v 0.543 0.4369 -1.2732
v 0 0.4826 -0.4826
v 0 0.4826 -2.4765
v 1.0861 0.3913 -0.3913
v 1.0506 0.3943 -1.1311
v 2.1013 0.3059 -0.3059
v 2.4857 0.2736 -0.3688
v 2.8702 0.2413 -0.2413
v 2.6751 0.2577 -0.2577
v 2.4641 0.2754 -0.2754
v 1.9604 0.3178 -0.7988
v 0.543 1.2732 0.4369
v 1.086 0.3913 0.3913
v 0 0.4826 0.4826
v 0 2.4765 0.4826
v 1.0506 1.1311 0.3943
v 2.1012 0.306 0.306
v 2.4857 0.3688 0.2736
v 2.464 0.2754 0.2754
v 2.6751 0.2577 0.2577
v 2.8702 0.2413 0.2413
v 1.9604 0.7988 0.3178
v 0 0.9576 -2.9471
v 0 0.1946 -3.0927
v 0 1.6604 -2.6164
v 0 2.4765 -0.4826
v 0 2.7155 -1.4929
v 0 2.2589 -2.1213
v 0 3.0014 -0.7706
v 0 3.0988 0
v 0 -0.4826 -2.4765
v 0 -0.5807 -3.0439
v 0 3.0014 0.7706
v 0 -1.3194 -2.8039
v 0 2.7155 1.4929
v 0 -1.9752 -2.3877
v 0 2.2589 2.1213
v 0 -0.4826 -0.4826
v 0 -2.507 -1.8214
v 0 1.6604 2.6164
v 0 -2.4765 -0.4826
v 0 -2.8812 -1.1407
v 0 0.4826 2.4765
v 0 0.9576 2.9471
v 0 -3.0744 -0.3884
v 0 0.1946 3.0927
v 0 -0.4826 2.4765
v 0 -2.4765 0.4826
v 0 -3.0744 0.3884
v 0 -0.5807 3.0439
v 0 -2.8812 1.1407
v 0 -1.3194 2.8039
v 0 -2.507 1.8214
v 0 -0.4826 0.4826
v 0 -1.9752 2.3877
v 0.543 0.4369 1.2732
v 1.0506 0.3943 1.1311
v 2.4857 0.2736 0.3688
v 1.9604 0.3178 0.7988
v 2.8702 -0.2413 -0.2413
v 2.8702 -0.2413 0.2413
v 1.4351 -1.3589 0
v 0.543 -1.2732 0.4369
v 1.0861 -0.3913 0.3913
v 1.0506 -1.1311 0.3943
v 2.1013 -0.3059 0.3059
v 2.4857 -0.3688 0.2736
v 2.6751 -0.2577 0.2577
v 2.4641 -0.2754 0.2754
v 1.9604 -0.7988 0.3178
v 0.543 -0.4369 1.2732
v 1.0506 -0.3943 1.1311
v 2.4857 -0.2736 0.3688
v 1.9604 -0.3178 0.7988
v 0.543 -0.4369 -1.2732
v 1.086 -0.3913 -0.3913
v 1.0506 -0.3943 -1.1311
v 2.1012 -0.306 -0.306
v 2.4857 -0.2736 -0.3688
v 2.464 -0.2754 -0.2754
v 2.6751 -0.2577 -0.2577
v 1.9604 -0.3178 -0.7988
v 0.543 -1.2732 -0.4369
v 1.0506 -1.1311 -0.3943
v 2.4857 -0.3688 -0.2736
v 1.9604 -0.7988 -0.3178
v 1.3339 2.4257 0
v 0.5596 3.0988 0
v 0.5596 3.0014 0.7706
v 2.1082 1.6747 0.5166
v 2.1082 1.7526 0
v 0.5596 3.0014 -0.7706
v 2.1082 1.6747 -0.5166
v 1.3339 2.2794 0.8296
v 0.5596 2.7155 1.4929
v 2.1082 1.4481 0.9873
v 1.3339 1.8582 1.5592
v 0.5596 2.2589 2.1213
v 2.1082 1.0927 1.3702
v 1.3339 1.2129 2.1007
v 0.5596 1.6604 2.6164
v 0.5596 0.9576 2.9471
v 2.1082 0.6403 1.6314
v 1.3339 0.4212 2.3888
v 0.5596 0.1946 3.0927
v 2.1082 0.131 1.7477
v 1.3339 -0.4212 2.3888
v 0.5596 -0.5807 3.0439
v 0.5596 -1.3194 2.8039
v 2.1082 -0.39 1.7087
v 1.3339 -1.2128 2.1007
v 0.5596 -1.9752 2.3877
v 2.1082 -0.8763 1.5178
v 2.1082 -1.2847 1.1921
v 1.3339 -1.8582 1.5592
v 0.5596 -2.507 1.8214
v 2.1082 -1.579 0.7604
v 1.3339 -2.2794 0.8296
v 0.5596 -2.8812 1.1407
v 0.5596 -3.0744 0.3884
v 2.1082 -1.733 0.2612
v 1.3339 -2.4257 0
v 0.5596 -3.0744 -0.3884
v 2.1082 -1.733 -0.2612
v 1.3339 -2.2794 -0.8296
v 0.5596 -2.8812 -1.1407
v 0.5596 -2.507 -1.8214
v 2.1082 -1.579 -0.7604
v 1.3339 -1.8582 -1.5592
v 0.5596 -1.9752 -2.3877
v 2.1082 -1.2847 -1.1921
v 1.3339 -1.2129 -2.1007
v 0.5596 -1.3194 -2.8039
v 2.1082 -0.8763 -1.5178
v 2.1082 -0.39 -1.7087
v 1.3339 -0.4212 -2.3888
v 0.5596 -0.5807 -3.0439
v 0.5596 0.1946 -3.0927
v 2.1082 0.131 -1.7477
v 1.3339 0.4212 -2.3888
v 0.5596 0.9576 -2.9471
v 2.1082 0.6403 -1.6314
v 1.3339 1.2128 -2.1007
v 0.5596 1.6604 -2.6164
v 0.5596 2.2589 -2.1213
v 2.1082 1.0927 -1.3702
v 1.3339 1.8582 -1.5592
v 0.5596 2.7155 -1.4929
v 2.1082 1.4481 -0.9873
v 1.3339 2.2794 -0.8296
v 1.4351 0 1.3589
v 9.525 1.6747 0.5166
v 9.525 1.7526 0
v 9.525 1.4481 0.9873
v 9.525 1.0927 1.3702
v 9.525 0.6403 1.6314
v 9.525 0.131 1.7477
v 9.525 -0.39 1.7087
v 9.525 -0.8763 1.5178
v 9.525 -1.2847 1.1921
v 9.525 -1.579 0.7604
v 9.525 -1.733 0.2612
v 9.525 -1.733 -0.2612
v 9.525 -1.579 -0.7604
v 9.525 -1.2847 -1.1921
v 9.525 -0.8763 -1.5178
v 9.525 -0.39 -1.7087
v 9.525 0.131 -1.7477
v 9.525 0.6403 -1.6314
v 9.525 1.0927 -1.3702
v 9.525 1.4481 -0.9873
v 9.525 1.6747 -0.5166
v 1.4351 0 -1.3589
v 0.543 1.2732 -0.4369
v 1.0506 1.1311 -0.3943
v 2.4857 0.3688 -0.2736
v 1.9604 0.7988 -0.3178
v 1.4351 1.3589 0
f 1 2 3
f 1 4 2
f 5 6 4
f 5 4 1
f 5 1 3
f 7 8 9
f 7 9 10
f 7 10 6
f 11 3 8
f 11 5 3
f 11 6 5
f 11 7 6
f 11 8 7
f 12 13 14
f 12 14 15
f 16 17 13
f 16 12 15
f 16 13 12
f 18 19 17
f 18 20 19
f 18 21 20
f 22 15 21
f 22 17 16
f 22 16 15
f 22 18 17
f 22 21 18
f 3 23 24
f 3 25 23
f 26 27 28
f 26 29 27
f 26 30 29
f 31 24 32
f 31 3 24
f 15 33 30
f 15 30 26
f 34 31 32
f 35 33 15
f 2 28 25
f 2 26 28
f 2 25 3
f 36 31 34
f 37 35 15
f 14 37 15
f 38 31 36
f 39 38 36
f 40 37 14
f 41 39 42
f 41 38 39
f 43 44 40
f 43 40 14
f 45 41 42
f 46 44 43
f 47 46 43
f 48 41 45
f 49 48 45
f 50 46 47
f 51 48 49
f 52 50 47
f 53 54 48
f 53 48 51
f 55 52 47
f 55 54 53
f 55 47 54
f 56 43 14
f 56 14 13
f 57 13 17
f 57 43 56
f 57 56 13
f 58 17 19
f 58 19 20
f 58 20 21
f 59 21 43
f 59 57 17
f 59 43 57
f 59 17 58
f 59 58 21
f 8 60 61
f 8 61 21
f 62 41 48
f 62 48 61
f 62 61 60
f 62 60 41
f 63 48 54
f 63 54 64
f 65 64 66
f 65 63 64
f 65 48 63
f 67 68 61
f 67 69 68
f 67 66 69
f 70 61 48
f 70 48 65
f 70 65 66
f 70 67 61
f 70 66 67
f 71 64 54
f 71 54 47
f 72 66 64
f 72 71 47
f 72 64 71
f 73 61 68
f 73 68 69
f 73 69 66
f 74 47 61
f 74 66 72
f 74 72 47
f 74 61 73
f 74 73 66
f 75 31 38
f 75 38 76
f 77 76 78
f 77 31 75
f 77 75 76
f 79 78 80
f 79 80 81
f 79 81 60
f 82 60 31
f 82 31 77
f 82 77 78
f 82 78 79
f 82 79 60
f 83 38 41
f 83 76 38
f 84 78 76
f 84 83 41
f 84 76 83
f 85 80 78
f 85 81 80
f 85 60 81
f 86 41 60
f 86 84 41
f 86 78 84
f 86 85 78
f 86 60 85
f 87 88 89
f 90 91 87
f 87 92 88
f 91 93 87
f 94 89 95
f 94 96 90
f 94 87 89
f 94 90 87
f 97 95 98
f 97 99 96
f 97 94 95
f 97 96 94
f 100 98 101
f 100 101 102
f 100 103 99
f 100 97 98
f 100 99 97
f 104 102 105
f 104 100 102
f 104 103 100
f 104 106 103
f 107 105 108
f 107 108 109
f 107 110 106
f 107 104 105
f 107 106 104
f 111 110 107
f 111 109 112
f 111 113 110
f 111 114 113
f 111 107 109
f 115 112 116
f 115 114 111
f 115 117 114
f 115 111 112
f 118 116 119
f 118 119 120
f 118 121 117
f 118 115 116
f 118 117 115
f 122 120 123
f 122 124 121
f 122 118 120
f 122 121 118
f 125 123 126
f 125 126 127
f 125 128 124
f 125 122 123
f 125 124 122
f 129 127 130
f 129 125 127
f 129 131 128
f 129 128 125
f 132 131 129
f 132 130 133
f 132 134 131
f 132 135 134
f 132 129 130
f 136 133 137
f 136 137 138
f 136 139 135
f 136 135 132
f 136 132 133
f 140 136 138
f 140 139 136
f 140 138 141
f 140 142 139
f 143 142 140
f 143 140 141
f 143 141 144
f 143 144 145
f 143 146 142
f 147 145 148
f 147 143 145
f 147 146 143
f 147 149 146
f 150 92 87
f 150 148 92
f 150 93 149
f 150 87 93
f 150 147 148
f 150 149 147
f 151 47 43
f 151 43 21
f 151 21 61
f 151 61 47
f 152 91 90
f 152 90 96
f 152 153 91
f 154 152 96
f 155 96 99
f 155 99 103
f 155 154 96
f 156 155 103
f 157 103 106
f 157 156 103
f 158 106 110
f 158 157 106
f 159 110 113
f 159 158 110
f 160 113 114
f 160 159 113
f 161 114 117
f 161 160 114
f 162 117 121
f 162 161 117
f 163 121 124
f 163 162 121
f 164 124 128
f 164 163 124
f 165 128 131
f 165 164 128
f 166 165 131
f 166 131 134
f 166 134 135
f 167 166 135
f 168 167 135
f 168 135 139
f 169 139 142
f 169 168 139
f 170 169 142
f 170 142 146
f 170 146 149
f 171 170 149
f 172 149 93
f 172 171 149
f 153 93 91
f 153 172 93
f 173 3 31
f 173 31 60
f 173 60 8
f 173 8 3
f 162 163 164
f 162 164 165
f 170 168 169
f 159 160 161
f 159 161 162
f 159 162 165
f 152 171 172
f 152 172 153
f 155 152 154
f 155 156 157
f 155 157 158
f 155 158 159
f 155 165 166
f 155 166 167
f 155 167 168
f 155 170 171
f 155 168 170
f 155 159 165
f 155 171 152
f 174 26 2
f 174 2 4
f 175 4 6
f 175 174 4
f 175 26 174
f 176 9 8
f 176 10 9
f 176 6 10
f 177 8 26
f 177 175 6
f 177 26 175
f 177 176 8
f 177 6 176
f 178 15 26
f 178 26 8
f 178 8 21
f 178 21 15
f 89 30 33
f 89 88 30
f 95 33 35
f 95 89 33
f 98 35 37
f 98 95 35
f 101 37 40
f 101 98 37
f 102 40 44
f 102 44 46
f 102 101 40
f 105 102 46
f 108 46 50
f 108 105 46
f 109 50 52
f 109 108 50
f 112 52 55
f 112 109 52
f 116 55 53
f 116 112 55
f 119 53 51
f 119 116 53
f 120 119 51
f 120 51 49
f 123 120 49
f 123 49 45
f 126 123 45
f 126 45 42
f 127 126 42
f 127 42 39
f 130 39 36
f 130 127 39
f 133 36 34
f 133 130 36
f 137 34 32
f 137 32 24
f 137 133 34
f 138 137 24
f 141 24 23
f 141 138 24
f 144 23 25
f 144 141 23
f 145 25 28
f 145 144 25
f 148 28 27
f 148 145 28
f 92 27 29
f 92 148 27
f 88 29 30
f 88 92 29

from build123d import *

# Parameters (mm, degrees)
SKETCH3_W         = 0.9652
SKETCH3_H         = 4.953
SKETCH4_W         = 0.4826
SKETCH4_H         = 0.4826
CIRPATTERN1_COUNT = 2
CIRPATTERN1_ANGLE = 90


with BuildPart() as part:
    # BodySke → Base-Revolve (revolve)
    with BuildSketch(Plane.XY):
        Polygon((0, 0), (0, 3.0988), (0.55957405, 3.0988), (2.1082, 1.7526), (9.525, 1.7526), (9.525, 0), align=None)
    revolve(axis=Axis((-6.35, 0, 0), (1, 0, 0)))

    # Sketch3 → Cross section 0
    with BuildSketch(Plane.ZY):
        Rectangle(SKETCH3_W, SKETCH3_H)
    # Sketch4 → Cross section 1
    with BuildSketch(Plane.ZY.offset(-2.8702)):
        Rectangle(SKETCH4_W, SKETCH4_H)
    cross = loft(mode=Mode.SUBTRACT)

    # CirPattern1: Cross ×2 about axis
    cirpattern1_axis = Axis((0, 0, 0), (1, 0, 0))
    for i in range(1, CIRPATTERN1_COUNT):
        add(cross.rotate(cirpattern1_axis, i * CIRPATTERN1_ANGLE / (CIRPATTERN1_COUNT - 1)), mode=Mode.SUBTRACT)


solid = part.part
